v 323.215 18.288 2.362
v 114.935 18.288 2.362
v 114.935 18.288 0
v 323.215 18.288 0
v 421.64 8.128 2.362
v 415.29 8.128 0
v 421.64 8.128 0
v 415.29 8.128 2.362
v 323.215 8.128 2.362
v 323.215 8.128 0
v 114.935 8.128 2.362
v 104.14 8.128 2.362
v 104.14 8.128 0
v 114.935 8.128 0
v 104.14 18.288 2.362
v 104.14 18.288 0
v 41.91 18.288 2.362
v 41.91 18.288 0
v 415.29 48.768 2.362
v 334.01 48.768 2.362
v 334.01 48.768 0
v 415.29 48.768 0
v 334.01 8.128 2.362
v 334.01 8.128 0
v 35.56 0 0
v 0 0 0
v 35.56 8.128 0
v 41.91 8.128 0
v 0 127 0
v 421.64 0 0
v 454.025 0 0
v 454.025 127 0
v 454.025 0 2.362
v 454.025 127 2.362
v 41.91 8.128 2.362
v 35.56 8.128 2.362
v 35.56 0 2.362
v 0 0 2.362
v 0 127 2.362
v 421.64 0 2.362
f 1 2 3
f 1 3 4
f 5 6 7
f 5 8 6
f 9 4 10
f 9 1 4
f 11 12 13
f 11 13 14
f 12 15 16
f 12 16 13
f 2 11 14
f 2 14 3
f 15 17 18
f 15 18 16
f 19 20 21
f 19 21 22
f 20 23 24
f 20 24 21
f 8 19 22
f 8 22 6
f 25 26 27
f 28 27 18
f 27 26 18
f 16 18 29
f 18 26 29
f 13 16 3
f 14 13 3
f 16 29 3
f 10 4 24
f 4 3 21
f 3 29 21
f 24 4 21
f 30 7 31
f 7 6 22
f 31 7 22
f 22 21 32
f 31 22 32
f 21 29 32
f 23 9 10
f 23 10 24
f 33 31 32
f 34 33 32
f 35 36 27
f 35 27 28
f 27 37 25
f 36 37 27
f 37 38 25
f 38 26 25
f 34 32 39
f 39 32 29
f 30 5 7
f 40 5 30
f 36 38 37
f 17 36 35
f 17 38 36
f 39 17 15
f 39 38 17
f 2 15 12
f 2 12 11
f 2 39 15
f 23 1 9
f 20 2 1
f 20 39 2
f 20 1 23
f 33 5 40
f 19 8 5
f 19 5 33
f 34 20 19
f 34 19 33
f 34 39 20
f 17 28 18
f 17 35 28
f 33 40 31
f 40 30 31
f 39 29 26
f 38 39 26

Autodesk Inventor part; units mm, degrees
ref_plane "YZ Plane" through (0, 0, 0) normal (1, 0, 0) x (0, 1, 0)
ref_plane "XZ Plane" through (0, 0, 0) normal (0, 1, 0) x (-1, 0, 0)
ref_plane "XY Plane" through (0, 0, 0) normal (0, 0, 1) x (1, 0, 0)
sketch "Sketch1" plane through (0, 0, 0) normal (0, 0, 1) x (1, 0, 0)
  line L0 (0, 0) -> (454.025, 0)
  line L1 (454.025, 0) -> (454.025, 127)
  line L2 (454.025, 127) -> (0, 127)
  line L3 (0, 127) -> (0, 0)
  dimension "d0" = 127
  dimension "d1" = 454.025
extrude "Extrusion1" add sketch "Sketch1" along normal blind 2.3622
sketch "Sketch2" plane through (0, 0, 2.3622) normal (0, 0, 1) x (1, 0, 0)
  line L0 (35.56, 0) -> (35.56, 8.128)
  line L1 (35.56, 8.128) -> (41.91, 8.128)
  line L2 (41.91, 8.128) -> (41.91, 18.288)
  line L3 (41.91, 18.288) -> (104.14, 18.288)
  line L4 (104.14, 18.288) -> (104.14, 8.128)
  line L5 (104.14, 8.128) -> (114.935, 8.128)
  line L6 (114.935, 8.128) -> (114.935, 18.288)
  line L7 (114.935, 18.288) -> (323.215, 18.288)
  line L8 (323.215, 18.288) -> (323.215, 8.128)
  line L9 (323.215, 8.128) -> (334.01, 8.128)
  line L10 (334.01, 8.128) -> (334.01, 48.768)
  line L11 (334.01, 48.768) -> (415.29, 48.768)
  line L12 (415.29, 48.768) -> (415.29, 8.128)
  line L13 (415.29, 8.128) -> (421.64, 8.128)
  line L14 (421.64, 8.128) -> (421.64, 0)
  line L15 (0, 127) -> (0, 0) projected
  line L16 (454.025, 0) -> (454.025, 127) projected
  line L17 (0, 0) -> (454.025, 0) projected
  line L18 (35.56, 0) -> (421.64, 0)
  dimension "d4" = 35.56
  dimension "d5" = 6.35
  dimension "d6" = 62.23
  dimension "d7" = 10.795
  dimension "d8" = 208.28
  dimension "d12" = 8.128
  dimension "d13" = 10.16
  dimension "d14" = 10.16
  dimension "d15" = 40.64
  dimension "d18" = 454.025
  dimension "d19" = 10.795
  dimension "d20" = 81.28
  dimension "d21" = 6.35
extrude "Extrusion2" cut sketch "Sketch2" against normal blind 2.3622
properties part number "TSIWall"
